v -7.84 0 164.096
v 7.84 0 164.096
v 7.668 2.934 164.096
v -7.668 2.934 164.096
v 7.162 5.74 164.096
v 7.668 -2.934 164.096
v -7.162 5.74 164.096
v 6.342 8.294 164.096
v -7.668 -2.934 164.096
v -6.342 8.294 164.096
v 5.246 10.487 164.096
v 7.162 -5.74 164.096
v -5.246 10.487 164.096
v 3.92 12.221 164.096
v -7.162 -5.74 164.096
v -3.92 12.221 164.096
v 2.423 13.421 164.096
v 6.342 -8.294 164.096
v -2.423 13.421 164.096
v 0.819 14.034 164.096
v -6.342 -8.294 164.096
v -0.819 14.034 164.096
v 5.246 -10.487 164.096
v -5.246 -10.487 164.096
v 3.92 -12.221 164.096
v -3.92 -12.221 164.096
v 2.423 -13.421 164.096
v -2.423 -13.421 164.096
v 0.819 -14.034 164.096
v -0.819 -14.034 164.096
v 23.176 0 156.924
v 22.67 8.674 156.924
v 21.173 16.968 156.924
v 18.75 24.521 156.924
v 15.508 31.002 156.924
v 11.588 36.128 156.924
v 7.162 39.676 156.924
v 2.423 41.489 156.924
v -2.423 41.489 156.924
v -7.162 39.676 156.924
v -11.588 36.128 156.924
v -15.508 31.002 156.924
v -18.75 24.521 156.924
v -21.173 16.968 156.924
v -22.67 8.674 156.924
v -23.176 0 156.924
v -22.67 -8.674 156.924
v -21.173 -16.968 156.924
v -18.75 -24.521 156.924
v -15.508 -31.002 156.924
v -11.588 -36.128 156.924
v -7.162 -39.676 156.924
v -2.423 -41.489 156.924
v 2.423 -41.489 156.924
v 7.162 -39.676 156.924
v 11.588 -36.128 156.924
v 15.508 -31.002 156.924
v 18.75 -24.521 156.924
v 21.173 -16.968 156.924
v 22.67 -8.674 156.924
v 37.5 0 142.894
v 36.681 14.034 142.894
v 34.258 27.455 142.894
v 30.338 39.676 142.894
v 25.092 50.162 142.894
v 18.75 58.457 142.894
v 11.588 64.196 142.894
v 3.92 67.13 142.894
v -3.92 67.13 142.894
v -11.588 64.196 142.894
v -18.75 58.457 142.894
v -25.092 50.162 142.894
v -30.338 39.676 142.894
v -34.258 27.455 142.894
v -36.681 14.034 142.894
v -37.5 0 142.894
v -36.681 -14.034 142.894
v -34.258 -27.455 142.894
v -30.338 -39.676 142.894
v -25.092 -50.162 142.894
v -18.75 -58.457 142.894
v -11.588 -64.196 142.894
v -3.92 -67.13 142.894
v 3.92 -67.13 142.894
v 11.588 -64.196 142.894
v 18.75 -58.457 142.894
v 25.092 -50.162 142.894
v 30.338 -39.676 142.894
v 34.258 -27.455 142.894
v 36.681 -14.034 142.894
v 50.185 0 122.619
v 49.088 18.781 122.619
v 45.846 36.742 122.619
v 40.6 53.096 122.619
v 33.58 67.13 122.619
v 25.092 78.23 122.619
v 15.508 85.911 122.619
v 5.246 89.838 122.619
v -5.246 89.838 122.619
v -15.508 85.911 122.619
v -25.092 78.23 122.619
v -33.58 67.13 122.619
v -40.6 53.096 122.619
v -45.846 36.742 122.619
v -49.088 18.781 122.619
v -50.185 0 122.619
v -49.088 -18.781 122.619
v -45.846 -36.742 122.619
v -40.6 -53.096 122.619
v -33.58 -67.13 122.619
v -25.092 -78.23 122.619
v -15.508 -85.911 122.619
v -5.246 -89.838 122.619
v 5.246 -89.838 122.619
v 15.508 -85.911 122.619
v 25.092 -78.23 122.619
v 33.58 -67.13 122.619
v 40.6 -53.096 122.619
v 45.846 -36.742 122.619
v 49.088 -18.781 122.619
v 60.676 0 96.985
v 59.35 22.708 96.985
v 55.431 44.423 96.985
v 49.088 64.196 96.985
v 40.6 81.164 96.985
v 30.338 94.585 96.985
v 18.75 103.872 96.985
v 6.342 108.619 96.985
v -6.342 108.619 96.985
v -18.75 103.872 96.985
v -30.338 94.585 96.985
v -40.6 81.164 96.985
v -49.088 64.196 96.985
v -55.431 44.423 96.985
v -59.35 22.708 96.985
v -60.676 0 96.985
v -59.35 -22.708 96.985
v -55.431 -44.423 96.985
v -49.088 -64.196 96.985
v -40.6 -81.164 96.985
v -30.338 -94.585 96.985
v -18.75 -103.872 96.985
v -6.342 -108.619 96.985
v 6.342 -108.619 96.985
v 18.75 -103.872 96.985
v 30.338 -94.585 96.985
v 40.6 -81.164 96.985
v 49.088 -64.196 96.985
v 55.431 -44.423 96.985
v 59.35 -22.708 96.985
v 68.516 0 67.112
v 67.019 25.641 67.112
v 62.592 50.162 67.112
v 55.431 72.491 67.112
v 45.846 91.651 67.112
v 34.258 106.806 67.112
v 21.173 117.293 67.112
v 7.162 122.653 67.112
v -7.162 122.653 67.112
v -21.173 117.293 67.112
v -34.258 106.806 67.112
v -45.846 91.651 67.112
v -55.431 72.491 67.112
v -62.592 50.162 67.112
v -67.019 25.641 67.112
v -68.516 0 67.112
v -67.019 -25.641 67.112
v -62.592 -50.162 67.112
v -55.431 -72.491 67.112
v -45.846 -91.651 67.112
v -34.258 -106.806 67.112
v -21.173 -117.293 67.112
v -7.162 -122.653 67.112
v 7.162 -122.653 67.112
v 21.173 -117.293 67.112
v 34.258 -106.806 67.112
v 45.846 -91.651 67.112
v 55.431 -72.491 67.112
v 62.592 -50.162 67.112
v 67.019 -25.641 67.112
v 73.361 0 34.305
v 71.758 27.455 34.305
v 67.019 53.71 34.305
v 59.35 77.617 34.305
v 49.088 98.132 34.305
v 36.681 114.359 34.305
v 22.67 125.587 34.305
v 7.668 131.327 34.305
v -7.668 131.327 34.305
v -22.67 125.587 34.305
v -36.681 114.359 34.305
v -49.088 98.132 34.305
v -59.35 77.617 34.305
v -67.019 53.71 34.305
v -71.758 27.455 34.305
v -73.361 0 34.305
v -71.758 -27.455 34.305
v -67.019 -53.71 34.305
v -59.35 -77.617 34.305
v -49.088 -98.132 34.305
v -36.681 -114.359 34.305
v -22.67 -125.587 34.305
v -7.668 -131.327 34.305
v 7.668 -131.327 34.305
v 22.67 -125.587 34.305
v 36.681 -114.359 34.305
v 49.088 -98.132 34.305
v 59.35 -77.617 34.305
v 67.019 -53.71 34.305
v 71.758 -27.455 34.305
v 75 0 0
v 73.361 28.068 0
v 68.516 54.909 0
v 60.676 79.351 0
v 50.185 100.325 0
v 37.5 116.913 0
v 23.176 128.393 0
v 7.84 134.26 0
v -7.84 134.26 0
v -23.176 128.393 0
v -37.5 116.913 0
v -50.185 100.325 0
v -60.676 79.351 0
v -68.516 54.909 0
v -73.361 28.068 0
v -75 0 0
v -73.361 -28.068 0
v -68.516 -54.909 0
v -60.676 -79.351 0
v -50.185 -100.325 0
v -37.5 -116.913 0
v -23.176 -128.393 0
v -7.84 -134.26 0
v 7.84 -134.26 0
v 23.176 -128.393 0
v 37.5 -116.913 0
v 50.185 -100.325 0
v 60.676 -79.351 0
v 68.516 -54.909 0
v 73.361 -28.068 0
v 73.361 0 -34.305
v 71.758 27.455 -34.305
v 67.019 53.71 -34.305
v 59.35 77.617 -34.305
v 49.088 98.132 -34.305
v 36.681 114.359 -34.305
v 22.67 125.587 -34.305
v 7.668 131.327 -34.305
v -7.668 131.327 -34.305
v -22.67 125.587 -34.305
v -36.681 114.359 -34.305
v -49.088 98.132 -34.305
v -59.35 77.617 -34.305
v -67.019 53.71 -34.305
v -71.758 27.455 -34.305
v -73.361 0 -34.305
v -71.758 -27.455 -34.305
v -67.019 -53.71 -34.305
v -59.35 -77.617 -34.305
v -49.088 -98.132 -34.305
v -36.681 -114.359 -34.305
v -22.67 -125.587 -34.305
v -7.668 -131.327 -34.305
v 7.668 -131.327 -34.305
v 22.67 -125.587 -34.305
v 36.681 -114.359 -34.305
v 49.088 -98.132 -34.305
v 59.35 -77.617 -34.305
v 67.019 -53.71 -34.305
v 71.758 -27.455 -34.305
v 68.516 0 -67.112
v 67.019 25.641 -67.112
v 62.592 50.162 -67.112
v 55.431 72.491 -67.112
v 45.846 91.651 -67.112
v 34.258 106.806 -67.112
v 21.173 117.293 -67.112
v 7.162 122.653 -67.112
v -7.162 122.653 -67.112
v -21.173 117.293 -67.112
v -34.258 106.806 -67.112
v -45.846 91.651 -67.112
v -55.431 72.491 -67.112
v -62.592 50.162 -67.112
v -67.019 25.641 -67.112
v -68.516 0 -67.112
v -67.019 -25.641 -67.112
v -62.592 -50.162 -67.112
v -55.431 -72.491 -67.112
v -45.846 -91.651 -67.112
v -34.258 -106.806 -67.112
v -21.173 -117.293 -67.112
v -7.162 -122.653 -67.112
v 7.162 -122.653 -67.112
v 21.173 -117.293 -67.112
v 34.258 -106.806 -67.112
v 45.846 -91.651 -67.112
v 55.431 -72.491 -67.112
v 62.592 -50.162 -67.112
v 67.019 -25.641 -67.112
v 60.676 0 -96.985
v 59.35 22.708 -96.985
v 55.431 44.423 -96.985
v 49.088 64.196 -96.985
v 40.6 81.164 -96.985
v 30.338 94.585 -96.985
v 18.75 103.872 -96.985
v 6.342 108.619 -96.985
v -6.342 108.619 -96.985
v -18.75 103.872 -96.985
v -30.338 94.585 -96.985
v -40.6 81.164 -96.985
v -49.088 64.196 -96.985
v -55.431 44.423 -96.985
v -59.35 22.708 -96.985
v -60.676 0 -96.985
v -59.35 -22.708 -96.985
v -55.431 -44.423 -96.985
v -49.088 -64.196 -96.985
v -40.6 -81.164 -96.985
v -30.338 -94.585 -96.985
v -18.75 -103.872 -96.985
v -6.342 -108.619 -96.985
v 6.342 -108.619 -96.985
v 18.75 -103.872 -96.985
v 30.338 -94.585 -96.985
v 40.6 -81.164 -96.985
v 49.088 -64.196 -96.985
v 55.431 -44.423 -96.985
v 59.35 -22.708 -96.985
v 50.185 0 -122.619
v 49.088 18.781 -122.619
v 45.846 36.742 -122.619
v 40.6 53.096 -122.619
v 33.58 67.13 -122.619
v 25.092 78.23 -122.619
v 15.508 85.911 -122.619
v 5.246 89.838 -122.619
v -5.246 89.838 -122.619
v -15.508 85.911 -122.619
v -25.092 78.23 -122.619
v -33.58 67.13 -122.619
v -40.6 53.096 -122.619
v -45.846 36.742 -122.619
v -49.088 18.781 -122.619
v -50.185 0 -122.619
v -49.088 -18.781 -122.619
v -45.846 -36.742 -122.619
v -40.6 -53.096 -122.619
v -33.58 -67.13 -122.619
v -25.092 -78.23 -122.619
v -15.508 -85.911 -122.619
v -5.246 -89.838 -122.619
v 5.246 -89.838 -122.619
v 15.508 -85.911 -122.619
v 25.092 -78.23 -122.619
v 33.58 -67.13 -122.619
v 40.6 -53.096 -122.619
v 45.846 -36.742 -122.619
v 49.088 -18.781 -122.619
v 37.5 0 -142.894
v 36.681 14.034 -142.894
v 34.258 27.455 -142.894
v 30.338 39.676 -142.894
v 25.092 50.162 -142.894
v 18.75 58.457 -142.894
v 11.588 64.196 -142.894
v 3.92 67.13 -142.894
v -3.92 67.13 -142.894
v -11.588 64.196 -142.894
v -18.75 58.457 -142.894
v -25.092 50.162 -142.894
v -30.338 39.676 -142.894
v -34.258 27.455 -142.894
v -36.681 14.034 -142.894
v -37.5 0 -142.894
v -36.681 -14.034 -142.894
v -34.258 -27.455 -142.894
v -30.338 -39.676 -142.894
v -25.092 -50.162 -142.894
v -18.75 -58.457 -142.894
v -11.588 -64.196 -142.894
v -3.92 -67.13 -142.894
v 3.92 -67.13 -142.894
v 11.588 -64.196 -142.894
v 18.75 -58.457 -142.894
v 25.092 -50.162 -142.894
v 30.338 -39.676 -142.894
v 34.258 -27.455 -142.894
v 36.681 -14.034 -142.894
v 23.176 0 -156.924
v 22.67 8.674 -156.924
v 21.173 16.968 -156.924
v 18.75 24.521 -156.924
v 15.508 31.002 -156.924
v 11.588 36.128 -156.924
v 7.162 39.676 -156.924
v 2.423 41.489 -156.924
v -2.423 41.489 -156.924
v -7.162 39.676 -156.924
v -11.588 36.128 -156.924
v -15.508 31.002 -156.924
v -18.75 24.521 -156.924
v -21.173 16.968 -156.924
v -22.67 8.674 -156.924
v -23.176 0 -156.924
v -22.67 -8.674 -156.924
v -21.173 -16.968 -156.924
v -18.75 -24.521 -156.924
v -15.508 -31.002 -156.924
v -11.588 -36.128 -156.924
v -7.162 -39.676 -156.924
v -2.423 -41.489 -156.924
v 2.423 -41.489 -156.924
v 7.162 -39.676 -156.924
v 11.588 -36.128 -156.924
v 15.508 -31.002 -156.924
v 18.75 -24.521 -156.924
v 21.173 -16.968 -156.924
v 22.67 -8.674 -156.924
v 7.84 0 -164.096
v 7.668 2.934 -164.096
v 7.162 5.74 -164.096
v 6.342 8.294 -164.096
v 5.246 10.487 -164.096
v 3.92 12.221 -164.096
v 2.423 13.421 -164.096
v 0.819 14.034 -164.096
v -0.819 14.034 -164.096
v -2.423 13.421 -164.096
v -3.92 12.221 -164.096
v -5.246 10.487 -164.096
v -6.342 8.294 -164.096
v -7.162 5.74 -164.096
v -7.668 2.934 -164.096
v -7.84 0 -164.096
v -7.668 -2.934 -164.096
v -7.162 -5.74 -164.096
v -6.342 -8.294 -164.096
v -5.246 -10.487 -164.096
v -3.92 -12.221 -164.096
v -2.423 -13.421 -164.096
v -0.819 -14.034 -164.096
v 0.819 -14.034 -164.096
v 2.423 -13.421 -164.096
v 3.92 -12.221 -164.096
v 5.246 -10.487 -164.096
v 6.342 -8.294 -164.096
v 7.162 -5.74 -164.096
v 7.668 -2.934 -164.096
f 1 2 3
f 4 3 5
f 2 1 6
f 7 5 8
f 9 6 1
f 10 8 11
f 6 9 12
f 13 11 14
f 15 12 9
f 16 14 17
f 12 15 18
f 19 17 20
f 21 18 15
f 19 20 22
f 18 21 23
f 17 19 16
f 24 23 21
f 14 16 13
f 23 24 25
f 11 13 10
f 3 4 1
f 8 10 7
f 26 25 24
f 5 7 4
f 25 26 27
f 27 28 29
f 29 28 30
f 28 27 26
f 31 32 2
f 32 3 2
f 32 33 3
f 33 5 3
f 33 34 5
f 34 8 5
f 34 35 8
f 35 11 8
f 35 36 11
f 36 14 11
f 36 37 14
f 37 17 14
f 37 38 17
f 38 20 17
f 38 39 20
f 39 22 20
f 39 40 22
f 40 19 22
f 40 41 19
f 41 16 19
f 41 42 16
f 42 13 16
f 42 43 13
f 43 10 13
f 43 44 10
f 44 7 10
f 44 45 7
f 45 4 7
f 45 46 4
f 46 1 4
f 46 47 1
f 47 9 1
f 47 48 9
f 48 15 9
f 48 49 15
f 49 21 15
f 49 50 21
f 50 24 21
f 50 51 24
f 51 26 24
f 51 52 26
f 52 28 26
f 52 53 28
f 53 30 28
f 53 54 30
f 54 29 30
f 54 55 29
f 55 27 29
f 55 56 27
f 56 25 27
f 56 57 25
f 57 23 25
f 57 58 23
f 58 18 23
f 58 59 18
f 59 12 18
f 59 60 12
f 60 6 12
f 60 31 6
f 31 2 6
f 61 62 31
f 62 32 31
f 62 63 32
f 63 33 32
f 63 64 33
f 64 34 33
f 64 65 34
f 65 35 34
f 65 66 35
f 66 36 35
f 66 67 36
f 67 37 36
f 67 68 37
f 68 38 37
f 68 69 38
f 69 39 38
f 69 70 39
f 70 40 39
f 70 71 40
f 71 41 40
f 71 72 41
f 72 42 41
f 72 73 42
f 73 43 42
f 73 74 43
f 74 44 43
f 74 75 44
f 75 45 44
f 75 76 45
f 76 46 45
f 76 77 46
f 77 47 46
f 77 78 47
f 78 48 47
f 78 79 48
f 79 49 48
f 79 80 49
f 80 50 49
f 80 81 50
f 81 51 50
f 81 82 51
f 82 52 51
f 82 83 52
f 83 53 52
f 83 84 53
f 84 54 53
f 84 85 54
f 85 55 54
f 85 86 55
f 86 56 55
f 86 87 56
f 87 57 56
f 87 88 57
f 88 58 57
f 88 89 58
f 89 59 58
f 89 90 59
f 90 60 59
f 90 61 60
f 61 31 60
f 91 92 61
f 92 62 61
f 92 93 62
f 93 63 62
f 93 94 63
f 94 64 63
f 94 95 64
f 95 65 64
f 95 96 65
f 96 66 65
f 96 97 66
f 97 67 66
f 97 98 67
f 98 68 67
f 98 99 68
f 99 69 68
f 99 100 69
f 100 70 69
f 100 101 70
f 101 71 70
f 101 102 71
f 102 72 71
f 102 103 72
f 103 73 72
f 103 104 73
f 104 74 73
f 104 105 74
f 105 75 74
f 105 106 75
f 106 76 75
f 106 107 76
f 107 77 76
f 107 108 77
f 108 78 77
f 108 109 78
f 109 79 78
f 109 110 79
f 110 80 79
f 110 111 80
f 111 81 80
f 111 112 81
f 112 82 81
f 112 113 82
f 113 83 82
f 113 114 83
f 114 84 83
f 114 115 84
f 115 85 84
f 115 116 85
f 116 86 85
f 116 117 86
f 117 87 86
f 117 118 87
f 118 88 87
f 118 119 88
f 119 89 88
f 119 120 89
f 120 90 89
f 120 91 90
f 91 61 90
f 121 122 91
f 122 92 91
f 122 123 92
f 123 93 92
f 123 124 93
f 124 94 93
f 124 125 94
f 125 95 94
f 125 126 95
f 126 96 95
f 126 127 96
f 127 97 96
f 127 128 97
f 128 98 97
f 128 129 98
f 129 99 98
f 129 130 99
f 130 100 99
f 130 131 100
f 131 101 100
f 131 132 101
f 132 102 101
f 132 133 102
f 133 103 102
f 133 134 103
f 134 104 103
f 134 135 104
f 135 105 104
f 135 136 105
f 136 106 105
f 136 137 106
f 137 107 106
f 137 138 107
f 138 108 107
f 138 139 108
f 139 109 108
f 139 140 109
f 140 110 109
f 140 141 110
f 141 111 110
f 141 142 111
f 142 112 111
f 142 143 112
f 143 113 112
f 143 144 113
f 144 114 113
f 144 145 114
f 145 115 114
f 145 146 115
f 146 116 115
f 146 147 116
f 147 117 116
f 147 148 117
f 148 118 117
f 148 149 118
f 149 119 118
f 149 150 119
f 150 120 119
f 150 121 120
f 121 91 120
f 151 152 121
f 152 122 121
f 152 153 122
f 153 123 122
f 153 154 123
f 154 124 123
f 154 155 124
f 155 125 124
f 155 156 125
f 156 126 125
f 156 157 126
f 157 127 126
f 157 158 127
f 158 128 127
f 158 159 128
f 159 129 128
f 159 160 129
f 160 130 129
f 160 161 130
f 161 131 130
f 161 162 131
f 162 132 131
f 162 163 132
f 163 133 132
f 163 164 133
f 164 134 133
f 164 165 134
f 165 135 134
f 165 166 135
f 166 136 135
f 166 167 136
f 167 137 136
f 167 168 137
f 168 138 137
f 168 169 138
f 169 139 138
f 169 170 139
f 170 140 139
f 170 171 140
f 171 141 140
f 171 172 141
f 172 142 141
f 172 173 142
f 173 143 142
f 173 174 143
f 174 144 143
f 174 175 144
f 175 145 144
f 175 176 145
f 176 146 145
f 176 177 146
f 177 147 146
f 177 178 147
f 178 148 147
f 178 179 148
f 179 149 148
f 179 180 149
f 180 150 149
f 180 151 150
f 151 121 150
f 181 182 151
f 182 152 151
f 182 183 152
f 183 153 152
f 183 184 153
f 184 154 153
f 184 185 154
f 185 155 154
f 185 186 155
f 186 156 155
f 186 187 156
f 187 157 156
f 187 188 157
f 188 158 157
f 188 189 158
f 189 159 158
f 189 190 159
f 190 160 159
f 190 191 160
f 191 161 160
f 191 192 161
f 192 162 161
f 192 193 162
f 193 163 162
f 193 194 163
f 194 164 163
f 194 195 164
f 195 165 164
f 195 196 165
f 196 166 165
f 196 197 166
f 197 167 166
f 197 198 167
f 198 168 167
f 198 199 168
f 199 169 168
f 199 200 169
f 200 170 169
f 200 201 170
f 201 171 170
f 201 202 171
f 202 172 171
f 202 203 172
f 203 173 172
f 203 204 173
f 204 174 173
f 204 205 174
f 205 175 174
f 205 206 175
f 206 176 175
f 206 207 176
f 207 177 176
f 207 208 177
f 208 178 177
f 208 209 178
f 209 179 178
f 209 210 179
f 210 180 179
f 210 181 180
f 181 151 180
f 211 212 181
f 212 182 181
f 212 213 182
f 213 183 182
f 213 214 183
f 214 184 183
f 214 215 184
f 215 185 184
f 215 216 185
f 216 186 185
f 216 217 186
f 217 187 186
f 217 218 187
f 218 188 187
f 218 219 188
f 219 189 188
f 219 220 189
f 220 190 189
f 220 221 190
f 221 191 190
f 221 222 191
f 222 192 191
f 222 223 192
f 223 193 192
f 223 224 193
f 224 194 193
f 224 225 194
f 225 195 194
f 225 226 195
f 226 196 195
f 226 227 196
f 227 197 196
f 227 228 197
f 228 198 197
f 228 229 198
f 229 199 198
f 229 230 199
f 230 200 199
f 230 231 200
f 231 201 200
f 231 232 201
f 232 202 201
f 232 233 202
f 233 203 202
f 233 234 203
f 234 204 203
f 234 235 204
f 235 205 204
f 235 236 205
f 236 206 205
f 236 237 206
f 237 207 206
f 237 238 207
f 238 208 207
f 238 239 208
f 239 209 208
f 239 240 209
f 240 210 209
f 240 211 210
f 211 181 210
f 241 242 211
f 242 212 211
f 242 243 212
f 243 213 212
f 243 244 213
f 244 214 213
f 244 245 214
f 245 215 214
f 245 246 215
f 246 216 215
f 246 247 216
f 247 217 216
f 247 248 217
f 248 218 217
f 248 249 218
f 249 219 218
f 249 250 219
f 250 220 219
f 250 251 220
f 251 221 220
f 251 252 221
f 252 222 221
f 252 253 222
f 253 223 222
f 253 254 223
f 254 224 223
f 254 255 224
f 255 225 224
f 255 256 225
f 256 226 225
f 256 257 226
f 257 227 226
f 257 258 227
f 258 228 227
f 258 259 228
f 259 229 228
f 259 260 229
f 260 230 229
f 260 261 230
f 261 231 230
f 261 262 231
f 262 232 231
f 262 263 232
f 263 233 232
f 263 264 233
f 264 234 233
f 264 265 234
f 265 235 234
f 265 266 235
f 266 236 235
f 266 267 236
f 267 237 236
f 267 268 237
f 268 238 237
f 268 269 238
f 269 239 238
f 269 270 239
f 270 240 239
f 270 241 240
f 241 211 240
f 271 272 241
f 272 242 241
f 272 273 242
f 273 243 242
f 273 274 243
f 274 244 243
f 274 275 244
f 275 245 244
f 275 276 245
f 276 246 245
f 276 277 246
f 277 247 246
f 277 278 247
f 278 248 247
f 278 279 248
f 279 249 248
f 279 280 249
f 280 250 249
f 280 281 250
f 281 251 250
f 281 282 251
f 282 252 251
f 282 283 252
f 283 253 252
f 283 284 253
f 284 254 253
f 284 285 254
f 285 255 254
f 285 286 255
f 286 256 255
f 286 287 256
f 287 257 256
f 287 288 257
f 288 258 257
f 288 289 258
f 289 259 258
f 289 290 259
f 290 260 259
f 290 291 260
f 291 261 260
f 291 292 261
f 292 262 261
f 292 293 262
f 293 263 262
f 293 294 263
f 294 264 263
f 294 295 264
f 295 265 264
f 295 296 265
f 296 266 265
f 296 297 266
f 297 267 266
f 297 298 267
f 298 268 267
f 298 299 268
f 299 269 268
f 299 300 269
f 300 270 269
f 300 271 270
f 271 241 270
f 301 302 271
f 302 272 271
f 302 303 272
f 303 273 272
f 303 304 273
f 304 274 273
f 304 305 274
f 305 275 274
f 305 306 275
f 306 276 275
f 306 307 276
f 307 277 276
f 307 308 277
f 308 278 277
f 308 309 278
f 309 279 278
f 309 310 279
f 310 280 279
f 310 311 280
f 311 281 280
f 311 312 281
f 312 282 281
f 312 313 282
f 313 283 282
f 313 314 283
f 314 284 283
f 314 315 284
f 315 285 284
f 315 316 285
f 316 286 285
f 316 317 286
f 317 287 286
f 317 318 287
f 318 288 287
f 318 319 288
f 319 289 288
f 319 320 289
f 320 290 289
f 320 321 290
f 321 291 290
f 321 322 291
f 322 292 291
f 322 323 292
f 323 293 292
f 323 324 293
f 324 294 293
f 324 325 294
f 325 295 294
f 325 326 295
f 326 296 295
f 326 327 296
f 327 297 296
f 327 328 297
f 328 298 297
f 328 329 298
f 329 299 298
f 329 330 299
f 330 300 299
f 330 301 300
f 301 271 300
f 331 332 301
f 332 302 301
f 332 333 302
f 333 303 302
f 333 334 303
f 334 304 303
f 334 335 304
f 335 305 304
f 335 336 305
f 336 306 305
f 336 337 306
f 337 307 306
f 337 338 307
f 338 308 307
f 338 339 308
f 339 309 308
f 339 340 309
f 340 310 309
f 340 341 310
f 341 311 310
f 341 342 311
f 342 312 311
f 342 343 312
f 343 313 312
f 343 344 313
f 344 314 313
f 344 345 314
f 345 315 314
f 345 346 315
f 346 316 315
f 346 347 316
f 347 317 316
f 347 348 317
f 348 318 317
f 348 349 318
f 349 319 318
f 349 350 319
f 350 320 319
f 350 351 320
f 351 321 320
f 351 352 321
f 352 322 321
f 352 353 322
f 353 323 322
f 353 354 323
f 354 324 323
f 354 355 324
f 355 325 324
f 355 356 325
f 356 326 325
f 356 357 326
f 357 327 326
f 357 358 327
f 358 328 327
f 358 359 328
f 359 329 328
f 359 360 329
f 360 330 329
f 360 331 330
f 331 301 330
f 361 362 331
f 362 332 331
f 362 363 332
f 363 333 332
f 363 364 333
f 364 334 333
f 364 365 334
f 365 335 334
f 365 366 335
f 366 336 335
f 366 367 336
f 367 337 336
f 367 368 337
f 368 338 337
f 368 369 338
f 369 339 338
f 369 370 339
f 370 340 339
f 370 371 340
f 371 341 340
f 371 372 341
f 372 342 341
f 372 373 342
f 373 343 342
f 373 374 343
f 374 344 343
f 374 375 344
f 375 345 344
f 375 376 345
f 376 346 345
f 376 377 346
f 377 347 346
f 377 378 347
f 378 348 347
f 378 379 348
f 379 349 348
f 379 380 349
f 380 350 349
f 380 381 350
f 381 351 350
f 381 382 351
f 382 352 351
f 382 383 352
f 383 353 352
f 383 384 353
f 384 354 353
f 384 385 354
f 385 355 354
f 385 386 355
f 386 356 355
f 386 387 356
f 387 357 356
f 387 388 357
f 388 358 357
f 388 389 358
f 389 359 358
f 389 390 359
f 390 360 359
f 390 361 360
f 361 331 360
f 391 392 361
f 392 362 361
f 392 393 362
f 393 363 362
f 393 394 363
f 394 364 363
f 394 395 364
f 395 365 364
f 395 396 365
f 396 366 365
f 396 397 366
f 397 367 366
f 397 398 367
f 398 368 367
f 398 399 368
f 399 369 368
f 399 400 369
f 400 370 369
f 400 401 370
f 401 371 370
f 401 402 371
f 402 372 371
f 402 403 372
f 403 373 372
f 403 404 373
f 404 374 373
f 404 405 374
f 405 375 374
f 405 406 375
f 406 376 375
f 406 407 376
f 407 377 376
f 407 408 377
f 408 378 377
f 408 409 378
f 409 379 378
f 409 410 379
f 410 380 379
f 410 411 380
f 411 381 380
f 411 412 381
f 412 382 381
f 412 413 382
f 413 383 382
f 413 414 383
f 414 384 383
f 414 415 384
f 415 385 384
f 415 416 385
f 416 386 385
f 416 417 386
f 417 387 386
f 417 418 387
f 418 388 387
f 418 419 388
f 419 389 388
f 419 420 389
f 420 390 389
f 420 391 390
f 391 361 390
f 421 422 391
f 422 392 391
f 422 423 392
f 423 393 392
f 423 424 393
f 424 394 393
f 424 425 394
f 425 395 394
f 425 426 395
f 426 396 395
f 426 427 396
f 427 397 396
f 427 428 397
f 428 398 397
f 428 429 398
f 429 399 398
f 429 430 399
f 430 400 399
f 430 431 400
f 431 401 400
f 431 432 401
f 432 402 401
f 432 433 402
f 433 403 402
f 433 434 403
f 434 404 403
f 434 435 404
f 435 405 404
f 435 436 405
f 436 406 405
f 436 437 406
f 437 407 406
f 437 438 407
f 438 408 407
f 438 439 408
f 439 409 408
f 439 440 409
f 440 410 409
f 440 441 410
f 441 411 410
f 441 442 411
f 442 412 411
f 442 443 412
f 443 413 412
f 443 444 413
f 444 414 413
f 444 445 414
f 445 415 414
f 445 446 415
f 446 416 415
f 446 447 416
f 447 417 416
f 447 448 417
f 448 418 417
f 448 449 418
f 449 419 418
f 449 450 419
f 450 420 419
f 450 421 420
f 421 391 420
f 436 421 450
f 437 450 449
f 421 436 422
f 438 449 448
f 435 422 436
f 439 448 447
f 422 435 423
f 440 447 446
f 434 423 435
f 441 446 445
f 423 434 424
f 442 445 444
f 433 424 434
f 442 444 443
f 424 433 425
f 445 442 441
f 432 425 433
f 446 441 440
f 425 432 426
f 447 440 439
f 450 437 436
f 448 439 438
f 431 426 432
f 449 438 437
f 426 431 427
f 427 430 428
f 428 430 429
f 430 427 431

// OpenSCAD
// Generated by SolidPython 1.0.1 on 2020-07-29 00:39:26


scale(v = [5, 9, 11]) {
	sphere(r = 15);
}
/***********************************************
*********      SolidPython code:      **********
************************************************
 
# import packages: SolidPython
from solid import *
from solid.utils import *
from itertools import chain, combinations


class Resize:

    def __init__(self, scad_file):
        self.scad_file = scad_file
        #self.scad_file = import_scad(scad_file)
        # cone/cylinder param:
        self.r1 = 0
        self.r2 = 0
        self.h = 0
        # rectangular prism param:
        self.w = 0
        self.l = 0
        # ellipse param:
        self.r = 0

    # import OpenScad code (file name corresponds to shape)


    # classify shape + parameters
    def assign(self, param1, param2, param3):
        if self.scad_file == 'cone.scad':
            self.r1 = param1
            self.r2 = param2
            self.h = param3
        elif self.scad_file == 'cylinder.scad':
            self.r1 = param1
            self.r2 = param2
            self.h = param3
        elif self.scad_file == 'rectangularPrism.scad':
            self.h = param1
            self.l = param2
            self.w = param3
        else:
            self.r = param1
            self.h = param2

    # resize parameters
    def iterate(self):
        x = range(3, 20, 2)
        i = 1
        if self.scad_file == 'cone.scad':
            tempList = list(combinations(x, 2))
            for temp in tempList:
                param1 = temp[0]
                param2 = temp[1]
                filepath = 'produced_scad_files/' + 'cone' + str(param1) + '_' + str(param2) + '_' + '.scad'
                scad_render_to_file(cylinder(h=param1, r1=param2, r2=0), filepath)

        elif self.scad_file == 'cylinder.scad':
            tempList = list(combinations(x, 3))
            for temp in tempList:
                param1 = temp[0]
                param2 = temp[1]
                filepath = 'produced_scad_files/' + 'cylinder' + str(param1) + '_' + str(param2) + '_' + '.scad'
                scad_render_to_file(cylinder(h=param1, r1=param2, r2=param2), filepath)

        elif self.scad_file == 'rectangularPrism.scad':
            tempList = list(combinations(x, 3))
            for temp in tempList:
                param1 = temp[0]
                param2 = temp[1]
                param3 = temp[2]
                filepath = 'produced_scad_files/' + 'rectangularPrism' + str(param1) + '_' + str(param2) + '_' + str(
                    param3) + '.scad'
                scad_render_to_file(cube(size=(param1, param2, param3)), filepath)

        elif self.scad_file == 'ellipse.scad':
            tempList = list(combinations(x, 4))
            for temp in tempList:
                param1 = temp[0]
                param2 = temp[1]
                param3 = temp[2]
                param4 = temp[3]
                filepath = 'produced_scad_files/' + 'ellipse' + str(param1) + '_' + str(param2) + '_' + str(param3) + '_' + str(param4) + '.scad'
                scad_render_to_file(scale([param1, param2, param3])(sphere(r=param4)), filepath)

    def render_to_scadfile(self):
        scad_render_to_file(scad, 'example.scad') 
 
************************************************/
